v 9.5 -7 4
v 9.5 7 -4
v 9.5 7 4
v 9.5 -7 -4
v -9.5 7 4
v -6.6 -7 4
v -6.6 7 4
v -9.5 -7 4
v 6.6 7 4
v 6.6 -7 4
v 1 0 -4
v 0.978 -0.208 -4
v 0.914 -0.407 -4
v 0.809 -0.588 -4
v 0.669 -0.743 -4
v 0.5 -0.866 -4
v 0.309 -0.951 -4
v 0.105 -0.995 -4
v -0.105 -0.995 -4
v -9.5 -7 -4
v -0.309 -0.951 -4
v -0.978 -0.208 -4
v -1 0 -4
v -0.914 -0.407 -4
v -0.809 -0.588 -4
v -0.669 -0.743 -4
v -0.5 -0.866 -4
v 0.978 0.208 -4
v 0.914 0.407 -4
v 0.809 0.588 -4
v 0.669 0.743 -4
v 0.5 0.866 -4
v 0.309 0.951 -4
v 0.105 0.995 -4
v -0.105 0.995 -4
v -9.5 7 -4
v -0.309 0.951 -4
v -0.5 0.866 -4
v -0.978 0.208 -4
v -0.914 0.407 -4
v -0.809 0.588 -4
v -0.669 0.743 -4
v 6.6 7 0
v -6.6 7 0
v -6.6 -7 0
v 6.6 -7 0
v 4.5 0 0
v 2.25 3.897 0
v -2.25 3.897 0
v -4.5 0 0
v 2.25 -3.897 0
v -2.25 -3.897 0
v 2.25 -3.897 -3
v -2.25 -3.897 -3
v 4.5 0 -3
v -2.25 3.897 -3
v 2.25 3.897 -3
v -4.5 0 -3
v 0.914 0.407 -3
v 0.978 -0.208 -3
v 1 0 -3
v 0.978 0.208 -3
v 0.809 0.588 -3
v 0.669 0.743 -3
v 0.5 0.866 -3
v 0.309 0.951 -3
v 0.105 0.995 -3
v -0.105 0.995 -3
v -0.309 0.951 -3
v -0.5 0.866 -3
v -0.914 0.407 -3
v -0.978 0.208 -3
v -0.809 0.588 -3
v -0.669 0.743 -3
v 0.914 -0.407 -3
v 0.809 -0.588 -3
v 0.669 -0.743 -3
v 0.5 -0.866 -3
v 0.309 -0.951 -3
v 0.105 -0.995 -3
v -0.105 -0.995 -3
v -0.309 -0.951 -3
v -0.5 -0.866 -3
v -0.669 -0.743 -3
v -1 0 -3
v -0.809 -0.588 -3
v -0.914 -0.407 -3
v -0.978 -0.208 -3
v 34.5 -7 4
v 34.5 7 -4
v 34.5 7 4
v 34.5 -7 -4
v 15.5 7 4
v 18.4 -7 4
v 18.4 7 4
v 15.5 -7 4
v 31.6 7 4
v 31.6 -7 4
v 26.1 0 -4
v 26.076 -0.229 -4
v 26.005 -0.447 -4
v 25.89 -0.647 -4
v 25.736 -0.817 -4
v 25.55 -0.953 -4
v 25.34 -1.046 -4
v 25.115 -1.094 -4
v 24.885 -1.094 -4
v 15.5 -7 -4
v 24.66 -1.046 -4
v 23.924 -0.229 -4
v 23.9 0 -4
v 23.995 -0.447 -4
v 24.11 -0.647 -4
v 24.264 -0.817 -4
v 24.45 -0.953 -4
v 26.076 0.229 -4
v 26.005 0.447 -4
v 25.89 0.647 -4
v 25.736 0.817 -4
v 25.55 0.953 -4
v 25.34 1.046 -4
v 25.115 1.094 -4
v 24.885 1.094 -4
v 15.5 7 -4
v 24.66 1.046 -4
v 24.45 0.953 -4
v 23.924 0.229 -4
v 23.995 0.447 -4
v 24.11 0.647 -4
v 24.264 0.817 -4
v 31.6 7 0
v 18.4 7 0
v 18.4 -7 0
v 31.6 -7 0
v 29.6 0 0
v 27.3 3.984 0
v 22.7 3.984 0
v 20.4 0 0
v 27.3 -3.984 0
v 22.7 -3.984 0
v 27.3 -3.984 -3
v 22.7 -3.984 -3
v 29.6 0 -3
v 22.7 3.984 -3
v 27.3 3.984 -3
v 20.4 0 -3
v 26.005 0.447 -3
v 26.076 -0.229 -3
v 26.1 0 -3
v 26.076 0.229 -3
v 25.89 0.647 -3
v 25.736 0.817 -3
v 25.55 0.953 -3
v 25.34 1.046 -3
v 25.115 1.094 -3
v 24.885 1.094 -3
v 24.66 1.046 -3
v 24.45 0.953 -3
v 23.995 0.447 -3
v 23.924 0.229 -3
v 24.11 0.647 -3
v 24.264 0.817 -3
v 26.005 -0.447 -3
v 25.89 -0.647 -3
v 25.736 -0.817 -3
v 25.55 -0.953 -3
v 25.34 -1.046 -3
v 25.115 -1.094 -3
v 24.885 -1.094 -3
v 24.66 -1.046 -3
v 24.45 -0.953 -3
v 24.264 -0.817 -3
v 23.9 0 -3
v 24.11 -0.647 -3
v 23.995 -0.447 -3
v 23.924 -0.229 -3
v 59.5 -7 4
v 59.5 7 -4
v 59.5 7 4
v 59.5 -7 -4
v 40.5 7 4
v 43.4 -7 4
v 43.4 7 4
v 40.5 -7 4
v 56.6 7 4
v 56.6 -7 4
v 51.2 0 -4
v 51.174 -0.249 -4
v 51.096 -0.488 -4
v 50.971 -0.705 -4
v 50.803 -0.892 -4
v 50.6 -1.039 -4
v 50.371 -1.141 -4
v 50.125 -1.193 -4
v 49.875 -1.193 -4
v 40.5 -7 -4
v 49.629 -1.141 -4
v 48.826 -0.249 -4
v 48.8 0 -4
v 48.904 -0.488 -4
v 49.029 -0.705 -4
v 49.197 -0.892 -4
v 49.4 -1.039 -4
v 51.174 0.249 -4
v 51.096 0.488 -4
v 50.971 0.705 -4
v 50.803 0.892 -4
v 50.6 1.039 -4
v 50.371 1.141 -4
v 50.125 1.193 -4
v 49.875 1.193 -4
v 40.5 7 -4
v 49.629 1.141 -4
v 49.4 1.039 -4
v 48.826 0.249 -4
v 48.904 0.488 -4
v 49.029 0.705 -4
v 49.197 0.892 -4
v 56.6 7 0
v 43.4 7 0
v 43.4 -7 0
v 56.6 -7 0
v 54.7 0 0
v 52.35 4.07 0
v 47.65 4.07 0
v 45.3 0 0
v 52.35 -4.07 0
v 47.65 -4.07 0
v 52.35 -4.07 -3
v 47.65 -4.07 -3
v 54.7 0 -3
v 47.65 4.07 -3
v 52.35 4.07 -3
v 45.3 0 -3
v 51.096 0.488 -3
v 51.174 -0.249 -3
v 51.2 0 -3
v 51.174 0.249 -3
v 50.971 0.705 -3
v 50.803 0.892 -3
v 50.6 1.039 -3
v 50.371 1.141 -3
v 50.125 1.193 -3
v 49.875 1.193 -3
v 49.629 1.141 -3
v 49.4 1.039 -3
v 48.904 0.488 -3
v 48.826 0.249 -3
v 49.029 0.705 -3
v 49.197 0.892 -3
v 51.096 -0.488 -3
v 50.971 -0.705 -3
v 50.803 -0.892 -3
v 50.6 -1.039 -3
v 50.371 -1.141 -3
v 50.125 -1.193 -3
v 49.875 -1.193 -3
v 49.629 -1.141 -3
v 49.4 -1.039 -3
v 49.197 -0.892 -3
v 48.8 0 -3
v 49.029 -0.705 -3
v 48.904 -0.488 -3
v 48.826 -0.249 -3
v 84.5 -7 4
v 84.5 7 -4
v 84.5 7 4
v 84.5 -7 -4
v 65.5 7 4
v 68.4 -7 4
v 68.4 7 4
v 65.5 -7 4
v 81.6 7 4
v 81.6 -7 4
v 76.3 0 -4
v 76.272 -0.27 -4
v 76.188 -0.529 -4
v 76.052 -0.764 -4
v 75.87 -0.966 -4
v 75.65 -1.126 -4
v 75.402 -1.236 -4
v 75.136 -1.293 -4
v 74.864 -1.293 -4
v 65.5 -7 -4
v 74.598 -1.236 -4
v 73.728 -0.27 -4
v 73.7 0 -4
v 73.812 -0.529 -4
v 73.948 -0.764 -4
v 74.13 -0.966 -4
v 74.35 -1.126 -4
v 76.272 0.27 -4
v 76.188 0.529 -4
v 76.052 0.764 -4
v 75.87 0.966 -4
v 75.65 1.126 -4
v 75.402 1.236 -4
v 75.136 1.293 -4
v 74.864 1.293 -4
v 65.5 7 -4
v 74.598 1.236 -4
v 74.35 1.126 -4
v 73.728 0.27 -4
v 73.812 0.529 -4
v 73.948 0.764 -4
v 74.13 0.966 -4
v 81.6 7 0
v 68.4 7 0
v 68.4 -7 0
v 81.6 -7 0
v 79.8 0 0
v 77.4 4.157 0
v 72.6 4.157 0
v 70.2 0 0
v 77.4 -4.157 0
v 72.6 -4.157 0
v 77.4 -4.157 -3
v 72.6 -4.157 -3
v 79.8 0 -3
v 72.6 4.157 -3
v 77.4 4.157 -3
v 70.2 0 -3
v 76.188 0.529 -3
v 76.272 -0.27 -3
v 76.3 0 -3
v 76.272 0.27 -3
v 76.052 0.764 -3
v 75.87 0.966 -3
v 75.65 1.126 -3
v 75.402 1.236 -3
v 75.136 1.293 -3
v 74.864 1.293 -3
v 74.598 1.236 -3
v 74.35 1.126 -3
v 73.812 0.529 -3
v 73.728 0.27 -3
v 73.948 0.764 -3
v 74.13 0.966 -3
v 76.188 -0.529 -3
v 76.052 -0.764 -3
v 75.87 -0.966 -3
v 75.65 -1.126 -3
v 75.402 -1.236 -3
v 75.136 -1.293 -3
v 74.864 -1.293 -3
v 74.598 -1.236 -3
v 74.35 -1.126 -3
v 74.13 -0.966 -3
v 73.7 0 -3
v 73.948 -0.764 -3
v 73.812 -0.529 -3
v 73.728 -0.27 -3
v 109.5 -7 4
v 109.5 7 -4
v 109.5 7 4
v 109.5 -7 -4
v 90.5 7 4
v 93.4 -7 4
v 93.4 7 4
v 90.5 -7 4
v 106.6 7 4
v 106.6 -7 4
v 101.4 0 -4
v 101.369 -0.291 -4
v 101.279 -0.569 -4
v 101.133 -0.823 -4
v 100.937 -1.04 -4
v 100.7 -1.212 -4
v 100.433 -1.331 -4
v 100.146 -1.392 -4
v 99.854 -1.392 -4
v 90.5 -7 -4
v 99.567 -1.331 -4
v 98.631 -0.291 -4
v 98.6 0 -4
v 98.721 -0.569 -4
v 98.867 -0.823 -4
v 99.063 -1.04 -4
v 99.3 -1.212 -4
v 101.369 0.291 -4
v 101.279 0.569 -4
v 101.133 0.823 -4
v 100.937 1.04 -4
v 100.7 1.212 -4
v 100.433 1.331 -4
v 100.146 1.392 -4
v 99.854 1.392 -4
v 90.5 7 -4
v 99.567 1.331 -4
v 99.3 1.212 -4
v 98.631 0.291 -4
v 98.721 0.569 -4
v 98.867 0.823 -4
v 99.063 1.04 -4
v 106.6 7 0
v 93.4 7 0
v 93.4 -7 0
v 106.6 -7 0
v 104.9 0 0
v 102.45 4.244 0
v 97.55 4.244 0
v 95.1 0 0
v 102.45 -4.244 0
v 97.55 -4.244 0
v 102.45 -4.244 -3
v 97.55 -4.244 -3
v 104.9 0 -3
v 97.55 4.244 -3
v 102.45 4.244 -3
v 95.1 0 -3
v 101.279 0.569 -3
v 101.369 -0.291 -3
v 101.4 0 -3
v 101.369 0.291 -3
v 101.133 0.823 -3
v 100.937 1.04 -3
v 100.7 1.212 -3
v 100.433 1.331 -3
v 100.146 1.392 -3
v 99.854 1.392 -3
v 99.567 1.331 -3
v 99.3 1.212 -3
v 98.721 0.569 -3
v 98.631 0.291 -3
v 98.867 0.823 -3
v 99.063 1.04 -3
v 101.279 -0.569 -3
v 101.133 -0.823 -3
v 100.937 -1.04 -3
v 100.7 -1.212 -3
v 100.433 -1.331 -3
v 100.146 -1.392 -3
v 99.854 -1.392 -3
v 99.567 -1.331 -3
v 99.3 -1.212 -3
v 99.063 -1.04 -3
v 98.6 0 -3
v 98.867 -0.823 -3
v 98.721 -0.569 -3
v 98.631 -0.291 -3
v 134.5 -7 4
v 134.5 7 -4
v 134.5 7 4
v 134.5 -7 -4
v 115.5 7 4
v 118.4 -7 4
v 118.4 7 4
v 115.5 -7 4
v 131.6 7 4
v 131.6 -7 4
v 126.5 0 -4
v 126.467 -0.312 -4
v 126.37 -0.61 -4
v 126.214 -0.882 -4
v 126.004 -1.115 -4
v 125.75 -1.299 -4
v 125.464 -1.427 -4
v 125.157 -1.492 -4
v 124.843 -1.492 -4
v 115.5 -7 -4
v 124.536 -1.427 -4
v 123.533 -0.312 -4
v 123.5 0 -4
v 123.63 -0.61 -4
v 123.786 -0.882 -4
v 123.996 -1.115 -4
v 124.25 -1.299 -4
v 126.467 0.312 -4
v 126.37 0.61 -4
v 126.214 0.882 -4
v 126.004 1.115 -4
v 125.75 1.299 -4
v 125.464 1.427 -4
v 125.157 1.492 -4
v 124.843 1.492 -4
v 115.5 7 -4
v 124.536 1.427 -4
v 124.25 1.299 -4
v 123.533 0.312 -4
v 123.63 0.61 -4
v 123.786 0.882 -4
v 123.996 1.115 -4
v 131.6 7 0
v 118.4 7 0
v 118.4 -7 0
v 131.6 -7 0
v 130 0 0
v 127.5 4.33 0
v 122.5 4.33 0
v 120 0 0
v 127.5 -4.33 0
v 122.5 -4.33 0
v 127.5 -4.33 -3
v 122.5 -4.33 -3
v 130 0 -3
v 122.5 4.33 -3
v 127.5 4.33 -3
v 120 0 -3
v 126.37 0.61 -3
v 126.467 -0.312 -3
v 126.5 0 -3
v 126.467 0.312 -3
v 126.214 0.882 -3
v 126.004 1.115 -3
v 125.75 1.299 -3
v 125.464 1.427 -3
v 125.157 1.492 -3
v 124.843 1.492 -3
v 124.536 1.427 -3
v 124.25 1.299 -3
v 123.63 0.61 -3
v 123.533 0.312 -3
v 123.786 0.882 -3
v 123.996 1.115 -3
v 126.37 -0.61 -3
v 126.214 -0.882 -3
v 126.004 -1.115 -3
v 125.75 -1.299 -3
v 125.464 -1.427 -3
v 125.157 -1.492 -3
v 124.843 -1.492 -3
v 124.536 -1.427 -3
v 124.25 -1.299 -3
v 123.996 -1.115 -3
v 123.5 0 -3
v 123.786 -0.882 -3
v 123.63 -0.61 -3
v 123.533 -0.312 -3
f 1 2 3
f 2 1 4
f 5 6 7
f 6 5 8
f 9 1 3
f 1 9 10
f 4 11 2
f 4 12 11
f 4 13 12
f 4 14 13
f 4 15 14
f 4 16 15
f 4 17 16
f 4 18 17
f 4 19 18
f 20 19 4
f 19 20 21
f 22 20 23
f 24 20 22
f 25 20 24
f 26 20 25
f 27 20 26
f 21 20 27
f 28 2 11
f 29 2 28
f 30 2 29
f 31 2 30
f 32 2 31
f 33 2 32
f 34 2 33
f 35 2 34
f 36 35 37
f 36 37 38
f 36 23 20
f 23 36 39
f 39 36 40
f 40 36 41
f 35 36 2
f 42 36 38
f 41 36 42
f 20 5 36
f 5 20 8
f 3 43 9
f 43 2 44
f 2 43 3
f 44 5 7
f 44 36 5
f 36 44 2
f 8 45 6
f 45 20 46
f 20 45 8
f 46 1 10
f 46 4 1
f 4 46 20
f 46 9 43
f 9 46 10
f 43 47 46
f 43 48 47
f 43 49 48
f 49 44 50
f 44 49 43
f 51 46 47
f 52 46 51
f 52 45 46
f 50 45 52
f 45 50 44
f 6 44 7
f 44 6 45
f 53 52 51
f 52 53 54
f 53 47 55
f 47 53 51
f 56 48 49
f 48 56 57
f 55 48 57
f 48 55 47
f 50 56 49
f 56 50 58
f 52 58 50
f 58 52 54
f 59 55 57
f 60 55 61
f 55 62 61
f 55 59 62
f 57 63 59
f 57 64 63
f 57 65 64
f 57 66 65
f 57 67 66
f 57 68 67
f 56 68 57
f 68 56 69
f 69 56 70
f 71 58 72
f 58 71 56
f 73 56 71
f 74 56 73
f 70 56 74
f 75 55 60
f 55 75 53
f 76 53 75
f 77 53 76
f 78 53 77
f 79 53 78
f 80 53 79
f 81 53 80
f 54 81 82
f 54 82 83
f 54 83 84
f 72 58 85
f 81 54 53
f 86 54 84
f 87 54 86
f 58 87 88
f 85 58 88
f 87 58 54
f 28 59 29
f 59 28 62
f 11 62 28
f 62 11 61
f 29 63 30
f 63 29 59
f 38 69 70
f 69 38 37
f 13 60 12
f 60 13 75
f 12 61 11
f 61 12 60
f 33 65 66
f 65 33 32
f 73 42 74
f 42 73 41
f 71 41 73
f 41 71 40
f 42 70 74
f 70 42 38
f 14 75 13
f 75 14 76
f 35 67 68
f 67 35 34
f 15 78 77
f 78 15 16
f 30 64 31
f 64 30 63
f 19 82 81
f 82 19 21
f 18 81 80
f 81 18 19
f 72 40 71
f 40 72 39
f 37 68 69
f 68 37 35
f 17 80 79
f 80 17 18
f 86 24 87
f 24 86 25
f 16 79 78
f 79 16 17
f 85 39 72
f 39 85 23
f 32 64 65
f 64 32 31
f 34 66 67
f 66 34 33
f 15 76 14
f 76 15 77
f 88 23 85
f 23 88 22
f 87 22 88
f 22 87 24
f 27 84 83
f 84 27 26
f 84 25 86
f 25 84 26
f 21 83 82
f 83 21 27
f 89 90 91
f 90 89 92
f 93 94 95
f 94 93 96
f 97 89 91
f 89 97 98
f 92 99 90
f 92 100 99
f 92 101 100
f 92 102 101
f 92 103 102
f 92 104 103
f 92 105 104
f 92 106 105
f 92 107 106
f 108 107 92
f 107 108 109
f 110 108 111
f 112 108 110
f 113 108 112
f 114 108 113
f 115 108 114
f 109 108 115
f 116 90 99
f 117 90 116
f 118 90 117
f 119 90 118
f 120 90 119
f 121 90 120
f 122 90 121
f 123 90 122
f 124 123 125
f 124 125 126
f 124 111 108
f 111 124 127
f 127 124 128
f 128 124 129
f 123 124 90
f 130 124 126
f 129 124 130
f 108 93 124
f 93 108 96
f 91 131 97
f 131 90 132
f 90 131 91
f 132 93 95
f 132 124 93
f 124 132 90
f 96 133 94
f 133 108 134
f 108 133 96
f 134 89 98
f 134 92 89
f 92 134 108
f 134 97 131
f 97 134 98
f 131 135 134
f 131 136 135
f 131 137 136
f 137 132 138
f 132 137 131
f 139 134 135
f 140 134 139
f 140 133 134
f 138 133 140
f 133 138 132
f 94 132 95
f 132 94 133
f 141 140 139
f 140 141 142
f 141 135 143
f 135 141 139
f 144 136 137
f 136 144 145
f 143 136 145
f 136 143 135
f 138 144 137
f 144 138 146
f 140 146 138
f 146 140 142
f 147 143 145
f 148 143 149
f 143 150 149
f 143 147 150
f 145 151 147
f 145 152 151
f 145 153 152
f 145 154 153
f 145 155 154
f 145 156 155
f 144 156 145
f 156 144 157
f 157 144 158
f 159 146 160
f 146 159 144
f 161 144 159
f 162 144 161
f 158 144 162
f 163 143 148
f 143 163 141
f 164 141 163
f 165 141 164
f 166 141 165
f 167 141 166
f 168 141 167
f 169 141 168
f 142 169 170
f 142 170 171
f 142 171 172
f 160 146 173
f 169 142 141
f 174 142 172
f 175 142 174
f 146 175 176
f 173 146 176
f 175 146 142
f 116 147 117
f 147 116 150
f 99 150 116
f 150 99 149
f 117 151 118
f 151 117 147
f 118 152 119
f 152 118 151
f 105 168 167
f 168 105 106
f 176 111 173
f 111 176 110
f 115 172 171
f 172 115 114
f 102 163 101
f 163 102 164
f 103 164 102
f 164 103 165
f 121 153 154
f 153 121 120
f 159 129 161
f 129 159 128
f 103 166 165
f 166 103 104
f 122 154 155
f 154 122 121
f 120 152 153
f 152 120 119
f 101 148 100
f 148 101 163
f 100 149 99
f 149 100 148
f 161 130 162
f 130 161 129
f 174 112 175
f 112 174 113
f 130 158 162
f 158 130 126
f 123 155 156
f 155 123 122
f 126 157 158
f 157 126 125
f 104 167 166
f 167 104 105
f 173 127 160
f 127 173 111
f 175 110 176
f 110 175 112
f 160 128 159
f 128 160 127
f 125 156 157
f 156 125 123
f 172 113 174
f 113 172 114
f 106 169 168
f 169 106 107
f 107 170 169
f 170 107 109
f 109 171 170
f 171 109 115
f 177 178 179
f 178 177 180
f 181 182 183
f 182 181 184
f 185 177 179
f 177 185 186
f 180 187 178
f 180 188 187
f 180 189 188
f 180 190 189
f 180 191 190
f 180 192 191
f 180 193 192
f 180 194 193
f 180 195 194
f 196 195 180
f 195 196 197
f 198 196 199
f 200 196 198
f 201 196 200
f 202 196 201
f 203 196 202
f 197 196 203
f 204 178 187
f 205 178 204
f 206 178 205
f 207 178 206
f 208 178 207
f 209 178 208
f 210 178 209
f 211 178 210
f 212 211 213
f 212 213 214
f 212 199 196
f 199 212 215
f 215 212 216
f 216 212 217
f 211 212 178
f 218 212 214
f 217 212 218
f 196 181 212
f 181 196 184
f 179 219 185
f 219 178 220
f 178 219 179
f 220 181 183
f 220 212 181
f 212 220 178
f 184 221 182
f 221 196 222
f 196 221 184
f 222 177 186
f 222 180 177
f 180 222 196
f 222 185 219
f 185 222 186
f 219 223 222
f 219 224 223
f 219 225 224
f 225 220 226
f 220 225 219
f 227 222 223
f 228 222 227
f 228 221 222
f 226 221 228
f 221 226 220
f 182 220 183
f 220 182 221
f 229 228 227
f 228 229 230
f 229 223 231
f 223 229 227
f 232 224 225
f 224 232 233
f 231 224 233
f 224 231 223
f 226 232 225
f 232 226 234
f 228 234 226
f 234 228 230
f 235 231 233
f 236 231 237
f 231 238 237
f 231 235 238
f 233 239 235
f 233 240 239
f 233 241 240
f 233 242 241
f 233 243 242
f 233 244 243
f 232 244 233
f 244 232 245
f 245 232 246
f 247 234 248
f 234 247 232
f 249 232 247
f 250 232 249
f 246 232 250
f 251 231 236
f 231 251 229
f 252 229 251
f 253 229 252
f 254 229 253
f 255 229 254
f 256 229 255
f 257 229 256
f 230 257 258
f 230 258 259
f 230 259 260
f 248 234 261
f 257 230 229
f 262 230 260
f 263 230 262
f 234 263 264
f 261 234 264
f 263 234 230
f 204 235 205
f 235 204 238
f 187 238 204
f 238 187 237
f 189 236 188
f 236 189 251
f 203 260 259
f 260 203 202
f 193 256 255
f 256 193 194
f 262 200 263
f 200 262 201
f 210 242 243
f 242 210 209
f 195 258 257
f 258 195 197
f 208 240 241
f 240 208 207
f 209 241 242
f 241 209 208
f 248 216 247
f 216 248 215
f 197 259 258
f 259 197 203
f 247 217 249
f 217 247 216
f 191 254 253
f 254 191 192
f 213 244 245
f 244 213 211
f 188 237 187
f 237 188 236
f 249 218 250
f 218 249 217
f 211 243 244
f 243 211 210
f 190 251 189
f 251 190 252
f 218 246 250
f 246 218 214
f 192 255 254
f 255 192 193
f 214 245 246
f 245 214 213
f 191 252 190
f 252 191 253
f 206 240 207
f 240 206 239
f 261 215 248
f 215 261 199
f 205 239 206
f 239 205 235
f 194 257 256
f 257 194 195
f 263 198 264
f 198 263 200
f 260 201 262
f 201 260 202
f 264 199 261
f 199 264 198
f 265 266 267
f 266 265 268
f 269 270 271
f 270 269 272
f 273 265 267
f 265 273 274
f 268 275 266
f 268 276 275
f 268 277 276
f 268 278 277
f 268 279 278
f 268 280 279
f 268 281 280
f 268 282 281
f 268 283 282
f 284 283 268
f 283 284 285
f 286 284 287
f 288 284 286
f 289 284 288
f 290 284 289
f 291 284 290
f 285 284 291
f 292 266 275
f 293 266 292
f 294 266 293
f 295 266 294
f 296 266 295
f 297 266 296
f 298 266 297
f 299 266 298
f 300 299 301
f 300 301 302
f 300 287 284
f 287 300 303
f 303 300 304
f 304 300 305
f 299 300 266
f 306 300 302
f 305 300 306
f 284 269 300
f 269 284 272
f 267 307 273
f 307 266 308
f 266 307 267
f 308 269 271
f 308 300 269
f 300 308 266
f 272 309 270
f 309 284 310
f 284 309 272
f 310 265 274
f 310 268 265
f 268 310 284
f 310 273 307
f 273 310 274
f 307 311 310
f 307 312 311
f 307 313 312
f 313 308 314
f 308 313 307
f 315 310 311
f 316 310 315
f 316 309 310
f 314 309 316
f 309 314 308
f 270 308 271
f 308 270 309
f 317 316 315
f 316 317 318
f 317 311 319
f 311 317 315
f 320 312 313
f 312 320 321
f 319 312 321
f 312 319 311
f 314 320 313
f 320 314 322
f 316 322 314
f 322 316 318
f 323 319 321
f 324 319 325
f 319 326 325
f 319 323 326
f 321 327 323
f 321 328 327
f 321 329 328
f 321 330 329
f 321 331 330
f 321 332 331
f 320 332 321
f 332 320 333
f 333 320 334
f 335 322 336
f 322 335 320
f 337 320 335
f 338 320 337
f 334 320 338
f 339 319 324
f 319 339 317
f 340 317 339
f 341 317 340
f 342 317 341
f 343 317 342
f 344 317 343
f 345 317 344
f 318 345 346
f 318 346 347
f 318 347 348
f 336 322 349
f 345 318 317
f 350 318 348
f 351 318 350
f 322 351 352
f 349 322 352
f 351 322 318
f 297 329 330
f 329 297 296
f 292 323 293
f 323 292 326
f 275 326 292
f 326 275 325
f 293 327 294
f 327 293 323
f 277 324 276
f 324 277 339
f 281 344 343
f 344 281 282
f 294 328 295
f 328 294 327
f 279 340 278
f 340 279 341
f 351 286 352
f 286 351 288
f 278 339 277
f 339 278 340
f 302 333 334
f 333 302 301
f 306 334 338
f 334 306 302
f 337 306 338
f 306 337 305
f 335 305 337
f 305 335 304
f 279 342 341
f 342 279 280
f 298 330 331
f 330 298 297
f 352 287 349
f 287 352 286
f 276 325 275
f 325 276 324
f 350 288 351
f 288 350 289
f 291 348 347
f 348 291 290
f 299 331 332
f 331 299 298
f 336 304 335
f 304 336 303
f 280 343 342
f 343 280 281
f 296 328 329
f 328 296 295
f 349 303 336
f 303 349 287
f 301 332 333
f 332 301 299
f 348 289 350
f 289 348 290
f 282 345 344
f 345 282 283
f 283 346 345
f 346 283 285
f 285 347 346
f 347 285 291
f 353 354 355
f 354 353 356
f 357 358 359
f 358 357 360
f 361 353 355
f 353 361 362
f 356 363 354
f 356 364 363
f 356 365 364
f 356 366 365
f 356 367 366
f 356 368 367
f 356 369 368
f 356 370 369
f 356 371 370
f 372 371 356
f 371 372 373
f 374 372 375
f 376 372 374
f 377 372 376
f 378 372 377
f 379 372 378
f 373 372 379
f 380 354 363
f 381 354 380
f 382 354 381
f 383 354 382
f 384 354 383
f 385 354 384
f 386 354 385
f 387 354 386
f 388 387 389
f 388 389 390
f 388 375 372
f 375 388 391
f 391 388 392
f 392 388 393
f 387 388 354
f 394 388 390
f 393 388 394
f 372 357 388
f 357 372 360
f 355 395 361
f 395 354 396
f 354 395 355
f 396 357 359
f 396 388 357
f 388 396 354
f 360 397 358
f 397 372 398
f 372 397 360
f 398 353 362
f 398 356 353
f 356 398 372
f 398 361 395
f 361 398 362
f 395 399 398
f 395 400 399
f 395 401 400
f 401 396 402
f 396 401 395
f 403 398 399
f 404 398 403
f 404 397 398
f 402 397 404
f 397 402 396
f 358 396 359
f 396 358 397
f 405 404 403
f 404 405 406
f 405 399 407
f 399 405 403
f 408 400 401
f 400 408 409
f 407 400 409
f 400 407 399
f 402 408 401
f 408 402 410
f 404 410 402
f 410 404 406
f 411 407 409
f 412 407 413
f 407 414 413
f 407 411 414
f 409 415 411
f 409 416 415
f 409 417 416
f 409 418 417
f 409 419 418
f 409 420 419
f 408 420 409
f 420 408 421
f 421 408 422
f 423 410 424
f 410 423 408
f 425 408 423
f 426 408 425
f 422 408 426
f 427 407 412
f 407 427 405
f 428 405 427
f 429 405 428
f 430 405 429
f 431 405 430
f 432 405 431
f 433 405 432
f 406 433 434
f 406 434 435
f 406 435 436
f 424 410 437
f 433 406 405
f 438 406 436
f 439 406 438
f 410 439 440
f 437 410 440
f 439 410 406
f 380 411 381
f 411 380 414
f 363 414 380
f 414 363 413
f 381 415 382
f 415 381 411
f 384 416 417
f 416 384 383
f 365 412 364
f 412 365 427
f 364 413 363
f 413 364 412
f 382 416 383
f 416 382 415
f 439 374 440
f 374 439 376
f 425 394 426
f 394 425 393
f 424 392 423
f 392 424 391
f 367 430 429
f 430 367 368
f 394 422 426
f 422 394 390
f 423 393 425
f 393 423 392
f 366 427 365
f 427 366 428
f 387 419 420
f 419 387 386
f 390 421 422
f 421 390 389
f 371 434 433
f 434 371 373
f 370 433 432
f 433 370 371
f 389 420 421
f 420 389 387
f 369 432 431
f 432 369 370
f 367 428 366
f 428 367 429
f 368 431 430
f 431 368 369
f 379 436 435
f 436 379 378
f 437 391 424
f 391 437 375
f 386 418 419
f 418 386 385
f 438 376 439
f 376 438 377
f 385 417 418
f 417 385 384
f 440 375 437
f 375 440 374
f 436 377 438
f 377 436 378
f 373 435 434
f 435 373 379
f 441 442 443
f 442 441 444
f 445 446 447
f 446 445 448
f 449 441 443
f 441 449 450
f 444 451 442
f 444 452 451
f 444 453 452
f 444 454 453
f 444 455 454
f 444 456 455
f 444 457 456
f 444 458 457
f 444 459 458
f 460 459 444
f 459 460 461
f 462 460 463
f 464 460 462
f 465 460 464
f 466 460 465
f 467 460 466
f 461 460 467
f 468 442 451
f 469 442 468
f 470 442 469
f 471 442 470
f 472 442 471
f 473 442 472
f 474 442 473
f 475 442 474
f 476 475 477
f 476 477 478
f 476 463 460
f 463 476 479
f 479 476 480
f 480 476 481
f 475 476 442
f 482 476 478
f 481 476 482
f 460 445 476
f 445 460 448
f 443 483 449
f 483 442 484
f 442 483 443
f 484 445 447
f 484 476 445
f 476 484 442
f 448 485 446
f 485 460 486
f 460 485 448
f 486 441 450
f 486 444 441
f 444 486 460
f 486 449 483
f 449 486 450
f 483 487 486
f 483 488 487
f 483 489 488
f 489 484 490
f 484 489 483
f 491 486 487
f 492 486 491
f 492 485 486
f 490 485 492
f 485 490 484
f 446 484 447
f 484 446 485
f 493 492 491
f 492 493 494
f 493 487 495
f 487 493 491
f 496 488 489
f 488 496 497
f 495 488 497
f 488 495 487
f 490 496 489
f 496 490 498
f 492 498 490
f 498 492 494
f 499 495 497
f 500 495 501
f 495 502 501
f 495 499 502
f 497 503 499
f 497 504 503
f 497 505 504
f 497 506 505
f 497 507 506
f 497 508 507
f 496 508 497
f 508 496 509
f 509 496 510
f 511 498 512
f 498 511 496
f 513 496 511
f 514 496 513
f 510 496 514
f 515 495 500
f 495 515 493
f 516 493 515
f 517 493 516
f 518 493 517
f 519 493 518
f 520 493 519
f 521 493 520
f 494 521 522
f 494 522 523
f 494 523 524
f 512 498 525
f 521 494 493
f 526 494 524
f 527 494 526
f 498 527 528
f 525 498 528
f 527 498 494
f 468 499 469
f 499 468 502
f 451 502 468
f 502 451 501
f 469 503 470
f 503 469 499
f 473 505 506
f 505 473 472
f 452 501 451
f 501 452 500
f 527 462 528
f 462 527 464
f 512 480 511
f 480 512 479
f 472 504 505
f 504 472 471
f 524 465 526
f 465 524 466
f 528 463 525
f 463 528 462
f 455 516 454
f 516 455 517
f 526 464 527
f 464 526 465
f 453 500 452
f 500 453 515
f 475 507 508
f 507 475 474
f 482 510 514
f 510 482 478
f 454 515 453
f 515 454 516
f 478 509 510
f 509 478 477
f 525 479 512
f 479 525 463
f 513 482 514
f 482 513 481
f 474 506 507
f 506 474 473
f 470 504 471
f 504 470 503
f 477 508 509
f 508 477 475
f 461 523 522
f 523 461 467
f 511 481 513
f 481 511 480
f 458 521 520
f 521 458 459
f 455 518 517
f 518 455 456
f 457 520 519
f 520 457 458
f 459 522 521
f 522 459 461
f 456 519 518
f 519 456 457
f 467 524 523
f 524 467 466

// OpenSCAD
// Various Z stop parts.

for (i = [0:5]) {
     translate([i * 25, 0, 0]) {
          BottomNutCapture(19, 14, 8, 13.2, 9 + i * 0.2, 3, 2 + i * 0.2);
     }
}

module BottomNutCapture(width, length, height, slotWidth, nutDiameter, nutHeight, screwDiameter) {
    // width = width in mm
    // length = length in mm
    // height = height in mm

    difference() {
        // body
        cube([width, length, height], center=true);

        // slot
        translate([0, -1, 10]) {
            cube([slotWidth, length + 3, 20], center=true);
        }

        // nut
        translate([0, 0, -nutHeight]) {
            cylinder(h = nutHeight + 1, d = nutDiameter, $fn=6, center=false);
        }

        // screw hole
        cylinder(h = height + 2, d = screwDiameter, $fn=30, center=true);
    }
}
